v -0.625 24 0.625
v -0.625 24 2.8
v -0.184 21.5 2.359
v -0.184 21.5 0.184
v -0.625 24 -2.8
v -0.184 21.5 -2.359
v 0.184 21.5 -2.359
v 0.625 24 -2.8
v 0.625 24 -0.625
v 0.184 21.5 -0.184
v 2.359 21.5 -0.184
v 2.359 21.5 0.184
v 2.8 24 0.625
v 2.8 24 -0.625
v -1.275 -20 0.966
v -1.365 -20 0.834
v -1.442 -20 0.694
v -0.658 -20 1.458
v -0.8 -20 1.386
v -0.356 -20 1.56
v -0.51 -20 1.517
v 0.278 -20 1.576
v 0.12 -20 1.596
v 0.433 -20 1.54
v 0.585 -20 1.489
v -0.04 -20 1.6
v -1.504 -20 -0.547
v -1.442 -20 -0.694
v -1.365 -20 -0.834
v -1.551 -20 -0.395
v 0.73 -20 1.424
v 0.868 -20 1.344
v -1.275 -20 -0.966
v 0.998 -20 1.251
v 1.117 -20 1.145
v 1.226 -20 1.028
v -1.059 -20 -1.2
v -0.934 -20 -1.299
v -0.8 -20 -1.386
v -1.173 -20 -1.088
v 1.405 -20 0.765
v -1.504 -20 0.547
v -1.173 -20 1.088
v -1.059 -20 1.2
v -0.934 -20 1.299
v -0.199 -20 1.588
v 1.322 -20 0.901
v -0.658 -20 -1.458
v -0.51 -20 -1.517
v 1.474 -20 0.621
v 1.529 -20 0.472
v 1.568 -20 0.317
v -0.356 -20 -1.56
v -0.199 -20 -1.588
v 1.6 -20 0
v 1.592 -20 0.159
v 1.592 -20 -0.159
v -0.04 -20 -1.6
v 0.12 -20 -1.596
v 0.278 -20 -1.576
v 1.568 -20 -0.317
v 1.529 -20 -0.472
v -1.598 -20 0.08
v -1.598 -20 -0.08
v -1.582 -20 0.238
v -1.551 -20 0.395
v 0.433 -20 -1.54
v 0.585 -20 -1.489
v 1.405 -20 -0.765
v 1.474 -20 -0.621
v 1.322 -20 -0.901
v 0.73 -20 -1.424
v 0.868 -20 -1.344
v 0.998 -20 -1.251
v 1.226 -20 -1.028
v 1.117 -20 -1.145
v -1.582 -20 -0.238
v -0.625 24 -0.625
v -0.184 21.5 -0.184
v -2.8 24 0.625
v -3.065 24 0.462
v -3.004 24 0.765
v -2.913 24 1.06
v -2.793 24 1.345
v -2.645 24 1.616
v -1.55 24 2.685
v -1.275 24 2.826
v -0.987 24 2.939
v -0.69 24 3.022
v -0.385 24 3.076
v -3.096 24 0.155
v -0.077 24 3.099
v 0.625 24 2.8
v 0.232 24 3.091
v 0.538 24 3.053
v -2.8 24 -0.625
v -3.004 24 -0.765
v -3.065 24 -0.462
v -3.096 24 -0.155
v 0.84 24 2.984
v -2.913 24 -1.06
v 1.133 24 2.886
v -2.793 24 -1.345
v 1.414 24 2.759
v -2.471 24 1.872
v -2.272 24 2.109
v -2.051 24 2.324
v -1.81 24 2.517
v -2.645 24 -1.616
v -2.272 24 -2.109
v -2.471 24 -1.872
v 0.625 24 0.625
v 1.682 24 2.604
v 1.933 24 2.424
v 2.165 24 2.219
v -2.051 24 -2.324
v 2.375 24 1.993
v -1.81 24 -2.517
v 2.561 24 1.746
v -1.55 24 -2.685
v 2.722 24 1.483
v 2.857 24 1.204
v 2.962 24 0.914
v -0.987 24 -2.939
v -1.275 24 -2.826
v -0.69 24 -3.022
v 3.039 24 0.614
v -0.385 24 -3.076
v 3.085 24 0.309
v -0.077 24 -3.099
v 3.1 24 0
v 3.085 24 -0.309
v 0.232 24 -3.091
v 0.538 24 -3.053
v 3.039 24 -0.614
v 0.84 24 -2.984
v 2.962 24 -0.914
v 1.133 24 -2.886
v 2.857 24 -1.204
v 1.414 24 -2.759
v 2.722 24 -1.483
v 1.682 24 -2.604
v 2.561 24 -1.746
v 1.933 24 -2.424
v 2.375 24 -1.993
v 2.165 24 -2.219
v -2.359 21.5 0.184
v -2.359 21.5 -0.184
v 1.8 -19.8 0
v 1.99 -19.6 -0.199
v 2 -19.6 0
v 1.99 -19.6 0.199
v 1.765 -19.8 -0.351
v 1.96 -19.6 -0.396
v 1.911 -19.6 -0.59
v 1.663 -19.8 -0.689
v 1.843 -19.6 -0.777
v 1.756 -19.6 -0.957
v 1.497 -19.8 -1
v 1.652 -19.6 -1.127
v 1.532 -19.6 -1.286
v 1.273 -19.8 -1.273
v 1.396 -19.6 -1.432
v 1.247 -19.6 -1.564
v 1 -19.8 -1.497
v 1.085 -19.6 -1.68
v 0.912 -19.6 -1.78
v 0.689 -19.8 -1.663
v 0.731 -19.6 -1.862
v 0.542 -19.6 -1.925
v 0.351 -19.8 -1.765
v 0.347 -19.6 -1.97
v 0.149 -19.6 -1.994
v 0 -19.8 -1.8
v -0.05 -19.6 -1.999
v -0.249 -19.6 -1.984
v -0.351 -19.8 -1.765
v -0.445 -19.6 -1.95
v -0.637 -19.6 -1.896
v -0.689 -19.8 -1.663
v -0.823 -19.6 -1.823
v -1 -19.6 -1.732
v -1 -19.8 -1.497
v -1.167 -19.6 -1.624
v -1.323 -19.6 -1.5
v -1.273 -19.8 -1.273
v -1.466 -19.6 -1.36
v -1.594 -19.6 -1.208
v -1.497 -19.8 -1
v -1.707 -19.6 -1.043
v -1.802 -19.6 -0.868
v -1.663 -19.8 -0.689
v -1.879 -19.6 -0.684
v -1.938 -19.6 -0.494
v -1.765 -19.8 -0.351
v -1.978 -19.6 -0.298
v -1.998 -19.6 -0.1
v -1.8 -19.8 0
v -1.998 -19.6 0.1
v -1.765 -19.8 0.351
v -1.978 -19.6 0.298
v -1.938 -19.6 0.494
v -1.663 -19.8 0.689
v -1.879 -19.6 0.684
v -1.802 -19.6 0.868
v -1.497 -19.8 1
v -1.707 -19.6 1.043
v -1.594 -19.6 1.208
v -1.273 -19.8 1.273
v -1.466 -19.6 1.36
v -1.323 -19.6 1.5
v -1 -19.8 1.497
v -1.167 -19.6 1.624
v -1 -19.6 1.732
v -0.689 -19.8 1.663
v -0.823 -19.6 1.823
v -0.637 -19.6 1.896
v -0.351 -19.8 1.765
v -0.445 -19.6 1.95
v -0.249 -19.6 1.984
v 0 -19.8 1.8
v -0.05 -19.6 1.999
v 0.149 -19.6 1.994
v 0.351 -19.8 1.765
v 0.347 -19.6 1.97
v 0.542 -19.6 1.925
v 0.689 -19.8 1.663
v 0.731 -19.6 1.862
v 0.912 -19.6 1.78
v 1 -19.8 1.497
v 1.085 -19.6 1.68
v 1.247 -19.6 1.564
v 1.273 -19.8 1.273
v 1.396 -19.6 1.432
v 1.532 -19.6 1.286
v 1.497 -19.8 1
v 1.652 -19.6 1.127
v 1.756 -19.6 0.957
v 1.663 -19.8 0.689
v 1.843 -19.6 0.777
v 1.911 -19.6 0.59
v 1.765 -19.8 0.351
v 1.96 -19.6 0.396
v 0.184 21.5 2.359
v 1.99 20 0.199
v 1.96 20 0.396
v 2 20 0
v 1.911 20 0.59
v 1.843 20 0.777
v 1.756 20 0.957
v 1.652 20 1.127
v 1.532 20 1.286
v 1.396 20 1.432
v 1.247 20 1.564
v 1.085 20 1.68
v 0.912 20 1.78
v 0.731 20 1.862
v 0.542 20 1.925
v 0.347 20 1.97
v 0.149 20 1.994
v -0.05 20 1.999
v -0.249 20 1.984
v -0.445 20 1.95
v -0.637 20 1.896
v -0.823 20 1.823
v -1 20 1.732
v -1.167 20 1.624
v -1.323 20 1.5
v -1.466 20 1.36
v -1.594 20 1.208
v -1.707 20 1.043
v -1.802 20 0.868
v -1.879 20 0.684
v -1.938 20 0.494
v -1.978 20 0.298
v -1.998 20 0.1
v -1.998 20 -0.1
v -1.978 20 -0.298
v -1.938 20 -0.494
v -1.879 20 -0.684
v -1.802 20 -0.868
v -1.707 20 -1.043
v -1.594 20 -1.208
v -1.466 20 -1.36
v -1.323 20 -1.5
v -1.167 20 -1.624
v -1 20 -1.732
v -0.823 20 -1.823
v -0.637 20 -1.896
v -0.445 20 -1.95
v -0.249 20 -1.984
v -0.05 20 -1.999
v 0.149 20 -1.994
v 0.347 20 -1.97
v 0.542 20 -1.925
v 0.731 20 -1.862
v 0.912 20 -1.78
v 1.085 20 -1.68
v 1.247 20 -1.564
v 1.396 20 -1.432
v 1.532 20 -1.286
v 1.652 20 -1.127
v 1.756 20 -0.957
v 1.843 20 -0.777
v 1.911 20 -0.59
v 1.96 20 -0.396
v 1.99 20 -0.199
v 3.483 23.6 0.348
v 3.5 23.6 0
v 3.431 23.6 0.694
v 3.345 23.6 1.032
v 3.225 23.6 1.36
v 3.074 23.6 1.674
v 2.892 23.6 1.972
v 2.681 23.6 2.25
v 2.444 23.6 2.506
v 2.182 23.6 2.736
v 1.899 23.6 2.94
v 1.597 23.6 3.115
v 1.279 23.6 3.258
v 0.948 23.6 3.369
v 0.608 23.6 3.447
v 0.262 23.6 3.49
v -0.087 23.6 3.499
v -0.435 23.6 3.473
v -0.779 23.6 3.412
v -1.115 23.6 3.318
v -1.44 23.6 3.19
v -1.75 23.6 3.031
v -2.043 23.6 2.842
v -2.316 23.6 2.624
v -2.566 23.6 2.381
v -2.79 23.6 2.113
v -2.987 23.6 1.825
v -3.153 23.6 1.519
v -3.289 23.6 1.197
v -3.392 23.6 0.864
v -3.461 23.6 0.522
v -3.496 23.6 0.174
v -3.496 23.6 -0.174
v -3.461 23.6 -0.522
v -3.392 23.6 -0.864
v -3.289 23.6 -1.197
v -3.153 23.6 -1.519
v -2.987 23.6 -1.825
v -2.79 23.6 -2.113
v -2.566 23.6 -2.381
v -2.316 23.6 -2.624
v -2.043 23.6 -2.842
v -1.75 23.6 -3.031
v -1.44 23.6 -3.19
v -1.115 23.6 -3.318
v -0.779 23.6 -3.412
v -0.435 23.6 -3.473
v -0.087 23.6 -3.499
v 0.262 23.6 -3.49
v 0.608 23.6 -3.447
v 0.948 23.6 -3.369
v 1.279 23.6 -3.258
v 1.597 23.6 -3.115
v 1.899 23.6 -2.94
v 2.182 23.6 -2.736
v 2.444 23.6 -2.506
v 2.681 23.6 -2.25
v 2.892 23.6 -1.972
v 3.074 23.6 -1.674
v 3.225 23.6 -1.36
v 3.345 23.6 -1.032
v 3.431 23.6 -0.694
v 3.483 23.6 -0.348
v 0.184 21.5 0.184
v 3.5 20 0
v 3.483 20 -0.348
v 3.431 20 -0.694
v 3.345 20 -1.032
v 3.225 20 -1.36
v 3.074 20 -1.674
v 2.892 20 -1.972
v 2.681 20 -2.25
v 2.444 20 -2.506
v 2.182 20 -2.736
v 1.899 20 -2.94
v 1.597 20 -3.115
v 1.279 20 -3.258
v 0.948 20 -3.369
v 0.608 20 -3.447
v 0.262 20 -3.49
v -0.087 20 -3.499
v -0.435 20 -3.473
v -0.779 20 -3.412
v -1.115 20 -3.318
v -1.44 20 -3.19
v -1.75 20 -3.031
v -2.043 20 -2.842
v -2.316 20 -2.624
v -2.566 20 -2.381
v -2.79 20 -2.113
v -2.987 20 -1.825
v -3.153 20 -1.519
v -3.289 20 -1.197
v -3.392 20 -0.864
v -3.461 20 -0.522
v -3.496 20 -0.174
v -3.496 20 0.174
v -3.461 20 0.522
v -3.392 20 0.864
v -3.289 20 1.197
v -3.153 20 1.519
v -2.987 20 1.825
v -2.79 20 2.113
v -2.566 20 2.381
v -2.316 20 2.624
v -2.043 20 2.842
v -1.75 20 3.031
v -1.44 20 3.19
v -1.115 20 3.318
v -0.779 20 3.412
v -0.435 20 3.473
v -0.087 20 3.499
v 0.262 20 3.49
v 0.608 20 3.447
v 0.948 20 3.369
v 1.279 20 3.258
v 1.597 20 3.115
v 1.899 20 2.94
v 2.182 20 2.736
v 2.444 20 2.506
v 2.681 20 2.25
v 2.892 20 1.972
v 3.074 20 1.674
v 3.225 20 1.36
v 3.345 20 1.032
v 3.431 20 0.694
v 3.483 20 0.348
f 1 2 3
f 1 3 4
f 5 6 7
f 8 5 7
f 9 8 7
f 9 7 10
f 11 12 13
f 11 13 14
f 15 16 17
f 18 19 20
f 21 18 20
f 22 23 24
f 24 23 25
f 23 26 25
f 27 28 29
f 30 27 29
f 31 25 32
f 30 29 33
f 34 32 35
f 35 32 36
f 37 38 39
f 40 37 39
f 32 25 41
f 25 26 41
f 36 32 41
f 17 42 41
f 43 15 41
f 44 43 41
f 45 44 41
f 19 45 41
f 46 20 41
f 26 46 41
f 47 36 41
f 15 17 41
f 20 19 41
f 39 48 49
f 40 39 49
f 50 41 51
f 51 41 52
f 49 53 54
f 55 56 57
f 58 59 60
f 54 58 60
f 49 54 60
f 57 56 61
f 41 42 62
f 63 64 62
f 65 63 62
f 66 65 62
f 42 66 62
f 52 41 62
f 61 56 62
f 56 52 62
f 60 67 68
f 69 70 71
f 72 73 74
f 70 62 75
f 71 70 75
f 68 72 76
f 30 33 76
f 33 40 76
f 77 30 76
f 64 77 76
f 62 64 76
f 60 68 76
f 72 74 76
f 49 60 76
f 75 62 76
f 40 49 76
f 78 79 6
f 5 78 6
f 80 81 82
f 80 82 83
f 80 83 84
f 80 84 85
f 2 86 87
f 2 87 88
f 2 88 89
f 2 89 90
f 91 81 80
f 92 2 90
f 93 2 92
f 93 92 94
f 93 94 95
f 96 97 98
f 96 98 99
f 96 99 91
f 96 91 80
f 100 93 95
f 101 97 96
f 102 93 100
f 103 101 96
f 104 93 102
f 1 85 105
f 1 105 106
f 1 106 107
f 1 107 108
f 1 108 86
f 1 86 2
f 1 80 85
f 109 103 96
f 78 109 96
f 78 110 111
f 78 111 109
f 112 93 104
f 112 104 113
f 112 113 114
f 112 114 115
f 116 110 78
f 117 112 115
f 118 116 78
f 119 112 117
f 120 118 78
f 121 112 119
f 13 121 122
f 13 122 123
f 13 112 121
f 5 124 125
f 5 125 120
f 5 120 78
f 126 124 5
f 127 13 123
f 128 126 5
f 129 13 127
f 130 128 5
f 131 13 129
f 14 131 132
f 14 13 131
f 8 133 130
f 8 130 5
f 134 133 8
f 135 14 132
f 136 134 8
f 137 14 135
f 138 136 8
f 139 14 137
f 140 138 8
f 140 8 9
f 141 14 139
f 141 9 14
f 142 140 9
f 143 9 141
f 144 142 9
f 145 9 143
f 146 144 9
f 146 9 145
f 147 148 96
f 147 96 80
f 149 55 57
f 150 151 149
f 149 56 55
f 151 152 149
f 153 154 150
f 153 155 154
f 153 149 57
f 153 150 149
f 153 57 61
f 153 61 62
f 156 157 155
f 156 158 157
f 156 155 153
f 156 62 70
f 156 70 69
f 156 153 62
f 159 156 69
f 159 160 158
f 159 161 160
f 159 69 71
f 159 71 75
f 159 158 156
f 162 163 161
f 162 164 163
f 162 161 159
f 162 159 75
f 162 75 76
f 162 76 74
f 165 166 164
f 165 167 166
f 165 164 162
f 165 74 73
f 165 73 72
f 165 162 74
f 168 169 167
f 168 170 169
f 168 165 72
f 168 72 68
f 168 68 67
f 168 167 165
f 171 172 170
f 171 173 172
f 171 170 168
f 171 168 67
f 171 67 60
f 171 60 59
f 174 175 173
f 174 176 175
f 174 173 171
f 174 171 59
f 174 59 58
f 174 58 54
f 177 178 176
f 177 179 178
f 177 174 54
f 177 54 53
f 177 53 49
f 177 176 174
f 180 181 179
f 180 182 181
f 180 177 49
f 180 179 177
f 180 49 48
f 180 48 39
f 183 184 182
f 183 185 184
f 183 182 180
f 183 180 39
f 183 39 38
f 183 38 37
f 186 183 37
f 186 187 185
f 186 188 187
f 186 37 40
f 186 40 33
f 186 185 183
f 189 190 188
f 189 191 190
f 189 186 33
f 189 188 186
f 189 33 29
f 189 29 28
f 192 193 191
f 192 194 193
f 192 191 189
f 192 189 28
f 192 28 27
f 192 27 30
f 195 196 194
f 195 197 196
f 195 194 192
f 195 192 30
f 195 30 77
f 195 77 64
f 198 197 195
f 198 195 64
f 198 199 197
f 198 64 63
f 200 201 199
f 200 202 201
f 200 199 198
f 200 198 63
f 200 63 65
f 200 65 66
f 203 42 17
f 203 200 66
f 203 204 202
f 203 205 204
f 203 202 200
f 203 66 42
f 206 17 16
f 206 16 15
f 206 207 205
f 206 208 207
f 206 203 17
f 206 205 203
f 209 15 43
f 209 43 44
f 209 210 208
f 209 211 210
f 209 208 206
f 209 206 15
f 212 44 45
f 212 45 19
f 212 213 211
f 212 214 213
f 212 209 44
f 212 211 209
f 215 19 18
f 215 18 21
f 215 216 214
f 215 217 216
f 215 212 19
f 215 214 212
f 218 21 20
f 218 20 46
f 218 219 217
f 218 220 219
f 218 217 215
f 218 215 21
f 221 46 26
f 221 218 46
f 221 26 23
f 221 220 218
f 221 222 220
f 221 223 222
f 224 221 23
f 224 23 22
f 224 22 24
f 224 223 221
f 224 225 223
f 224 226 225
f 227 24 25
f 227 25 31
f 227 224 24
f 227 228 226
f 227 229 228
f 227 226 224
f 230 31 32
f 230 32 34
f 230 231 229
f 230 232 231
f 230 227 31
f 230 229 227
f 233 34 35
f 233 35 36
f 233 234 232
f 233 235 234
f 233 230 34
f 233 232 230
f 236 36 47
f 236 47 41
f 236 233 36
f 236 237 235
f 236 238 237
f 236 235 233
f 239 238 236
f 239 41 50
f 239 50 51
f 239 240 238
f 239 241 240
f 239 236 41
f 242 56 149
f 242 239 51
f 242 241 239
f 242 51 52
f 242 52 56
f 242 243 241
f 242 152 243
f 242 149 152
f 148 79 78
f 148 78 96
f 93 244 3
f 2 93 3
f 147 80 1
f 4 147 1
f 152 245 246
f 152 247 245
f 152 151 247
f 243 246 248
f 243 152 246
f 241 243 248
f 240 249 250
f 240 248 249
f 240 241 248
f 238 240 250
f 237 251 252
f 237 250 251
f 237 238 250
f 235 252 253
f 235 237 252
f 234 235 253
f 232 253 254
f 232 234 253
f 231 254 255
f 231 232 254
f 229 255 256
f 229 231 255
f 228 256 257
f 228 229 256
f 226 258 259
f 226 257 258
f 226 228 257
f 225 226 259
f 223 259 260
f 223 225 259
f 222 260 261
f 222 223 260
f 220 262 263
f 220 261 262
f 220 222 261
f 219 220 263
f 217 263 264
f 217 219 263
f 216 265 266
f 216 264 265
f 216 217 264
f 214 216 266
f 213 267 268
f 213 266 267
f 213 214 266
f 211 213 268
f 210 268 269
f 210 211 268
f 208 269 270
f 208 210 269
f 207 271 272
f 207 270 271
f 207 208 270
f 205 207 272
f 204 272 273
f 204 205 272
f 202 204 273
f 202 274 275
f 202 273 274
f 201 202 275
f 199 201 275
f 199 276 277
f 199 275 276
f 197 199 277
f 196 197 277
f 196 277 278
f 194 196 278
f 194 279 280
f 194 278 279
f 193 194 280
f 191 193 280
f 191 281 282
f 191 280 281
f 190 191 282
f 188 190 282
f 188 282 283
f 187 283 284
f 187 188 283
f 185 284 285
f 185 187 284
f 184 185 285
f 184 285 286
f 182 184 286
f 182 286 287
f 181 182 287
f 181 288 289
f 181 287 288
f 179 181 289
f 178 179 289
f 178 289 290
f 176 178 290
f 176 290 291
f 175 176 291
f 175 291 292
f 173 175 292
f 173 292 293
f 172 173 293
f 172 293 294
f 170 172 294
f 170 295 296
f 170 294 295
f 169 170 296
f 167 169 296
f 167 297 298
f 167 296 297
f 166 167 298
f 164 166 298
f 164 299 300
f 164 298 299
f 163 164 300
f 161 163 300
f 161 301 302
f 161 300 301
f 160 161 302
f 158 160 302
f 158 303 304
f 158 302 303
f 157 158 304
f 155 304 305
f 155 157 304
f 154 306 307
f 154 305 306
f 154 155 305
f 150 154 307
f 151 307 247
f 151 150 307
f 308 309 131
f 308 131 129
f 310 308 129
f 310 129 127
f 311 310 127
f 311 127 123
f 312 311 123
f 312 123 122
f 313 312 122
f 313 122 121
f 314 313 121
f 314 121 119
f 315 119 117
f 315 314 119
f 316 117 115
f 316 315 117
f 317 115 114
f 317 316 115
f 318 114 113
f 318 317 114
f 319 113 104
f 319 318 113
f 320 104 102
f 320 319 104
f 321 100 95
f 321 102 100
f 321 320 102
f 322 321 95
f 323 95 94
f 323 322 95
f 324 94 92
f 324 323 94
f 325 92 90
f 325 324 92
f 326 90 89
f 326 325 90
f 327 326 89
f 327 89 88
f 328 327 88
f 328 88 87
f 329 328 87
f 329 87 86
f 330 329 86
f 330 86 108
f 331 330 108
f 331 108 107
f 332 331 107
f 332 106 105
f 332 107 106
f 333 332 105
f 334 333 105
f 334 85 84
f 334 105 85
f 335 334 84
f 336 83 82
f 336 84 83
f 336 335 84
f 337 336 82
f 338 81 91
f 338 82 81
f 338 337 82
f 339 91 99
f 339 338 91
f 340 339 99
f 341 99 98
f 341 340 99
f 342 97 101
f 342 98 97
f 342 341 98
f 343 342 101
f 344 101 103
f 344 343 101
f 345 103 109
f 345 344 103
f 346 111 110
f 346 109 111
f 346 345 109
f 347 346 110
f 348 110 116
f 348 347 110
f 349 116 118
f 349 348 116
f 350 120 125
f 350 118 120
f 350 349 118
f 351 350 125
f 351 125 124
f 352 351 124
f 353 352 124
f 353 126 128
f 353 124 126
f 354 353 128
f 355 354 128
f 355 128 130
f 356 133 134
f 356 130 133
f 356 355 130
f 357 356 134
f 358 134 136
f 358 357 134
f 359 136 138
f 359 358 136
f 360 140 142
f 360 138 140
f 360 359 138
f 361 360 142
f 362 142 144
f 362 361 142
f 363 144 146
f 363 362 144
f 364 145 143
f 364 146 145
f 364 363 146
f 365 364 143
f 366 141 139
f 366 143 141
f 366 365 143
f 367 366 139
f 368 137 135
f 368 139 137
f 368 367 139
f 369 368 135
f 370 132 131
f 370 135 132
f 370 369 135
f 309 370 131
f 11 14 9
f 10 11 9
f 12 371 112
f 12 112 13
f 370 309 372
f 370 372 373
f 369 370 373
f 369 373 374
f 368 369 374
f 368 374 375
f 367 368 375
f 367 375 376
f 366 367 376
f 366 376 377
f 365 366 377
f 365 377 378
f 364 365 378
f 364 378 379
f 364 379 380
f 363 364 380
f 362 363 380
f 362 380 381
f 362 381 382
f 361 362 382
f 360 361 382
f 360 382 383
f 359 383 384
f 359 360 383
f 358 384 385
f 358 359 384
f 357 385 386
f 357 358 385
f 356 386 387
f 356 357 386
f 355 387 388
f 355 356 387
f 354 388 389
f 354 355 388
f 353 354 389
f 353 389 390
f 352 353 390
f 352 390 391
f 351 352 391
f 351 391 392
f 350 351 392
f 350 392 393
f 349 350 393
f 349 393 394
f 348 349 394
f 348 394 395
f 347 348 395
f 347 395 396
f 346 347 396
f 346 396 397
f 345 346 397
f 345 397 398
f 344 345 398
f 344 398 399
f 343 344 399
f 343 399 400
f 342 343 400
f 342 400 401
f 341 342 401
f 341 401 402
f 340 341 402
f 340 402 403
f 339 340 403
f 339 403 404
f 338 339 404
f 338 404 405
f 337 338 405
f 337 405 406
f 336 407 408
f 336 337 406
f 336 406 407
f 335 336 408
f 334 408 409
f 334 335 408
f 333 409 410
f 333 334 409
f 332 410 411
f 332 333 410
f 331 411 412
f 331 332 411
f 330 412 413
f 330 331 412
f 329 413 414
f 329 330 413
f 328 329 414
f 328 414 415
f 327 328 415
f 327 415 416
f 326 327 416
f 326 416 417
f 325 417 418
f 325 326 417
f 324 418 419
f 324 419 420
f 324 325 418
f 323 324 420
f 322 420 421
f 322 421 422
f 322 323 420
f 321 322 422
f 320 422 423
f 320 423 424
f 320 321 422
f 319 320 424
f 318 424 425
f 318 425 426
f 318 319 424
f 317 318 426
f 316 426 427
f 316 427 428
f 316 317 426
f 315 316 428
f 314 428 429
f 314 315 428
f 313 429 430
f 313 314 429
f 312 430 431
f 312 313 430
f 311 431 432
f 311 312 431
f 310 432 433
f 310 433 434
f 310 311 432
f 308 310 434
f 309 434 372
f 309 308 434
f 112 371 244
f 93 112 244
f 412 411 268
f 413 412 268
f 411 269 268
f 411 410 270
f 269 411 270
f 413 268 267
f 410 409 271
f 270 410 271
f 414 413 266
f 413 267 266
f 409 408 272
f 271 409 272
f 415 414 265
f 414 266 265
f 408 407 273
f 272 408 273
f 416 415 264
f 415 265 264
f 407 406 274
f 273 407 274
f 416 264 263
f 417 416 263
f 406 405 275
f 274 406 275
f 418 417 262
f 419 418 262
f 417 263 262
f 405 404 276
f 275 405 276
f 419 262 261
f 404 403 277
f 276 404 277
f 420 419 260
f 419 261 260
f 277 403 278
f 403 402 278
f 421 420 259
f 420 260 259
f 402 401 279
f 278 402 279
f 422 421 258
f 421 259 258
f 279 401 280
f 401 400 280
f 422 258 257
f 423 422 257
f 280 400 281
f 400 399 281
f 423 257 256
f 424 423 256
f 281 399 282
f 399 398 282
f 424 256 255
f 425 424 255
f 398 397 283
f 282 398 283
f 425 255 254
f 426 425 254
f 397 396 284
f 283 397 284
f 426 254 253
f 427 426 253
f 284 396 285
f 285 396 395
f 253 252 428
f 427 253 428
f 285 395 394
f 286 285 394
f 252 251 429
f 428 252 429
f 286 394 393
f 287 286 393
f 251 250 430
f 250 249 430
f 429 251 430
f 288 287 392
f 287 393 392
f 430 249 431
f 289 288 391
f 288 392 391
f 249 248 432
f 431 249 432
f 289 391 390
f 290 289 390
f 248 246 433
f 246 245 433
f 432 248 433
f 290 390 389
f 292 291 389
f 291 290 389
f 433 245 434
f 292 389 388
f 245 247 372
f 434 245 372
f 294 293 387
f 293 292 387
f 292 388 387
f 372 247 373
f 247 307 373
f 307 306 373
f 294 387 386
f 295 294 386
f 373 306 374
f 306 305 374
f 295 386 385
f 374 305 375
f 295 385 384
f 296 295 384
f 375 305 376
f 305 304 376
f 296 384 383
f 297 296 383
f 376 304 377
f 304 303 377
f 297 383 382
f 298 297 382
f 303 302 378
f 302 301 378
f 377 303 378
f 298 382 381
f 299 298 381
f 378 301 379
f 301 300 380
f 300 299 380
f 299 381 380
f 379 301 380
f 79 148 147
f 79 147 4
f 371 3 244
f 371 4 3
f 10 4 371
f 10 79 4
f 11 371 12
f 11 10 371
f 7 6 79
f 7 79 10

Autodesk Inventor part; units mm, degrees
ref_plane "YZ Plane" through (0, 0, 0) normal (1, 0, 0) x (0, 1, 0)
ref_plane "XZ Plane" through (0, 0, 0) normal (0, 1, 0) x (-1, 0, 0)
ref_plane "XY Plane" through (0, 0, 0) normal (0, 0, 1) x (1, 0, 0)
sketch "Sketch1" plane through (0, 0, 0) normal (0, 0, 1) x (1, 0, 0)
  line L0 (-2, -20) -> (-2, 20)
  line L1 (-2, 20) -> (2, 20)
  line L2 (2, 20) -> (2, -20)
  line L3 (2, -20) -> (-2, -20)
  line L4 (-2, -20) -> (2, 20) construction
  line L5 (-2, 20) -> (2, -20) construction
  line L6 (0, -20) -> (0, -19.6)
  line L7 (0, -20) -> (1.6, -20)
  line L8 (0, -20) -> (-1.6, -20)
  line L9 (-1.6, -20) -> (-2, -19.6)
  line L10 (0, 22.999163) -> (0, 17.000837)
  line L11 (0, 20) -> (0, 24)
  line L12 (0, 24) -> (3.5, 24)
  line L13 (0, 20) -> (3.5, 20)
  line L14 (3.5, 20) -> (3.5, 24)
  line L15 (0, 24) -> (-3.5, 24)
  line L16 (-3.5, 24) -> (-3.5, 20)
  line L17 (-3.5, 20) -> (0, 20)
  line L18 (0, 24) -> (3.1, 24)
  line L19 (0, 24) -> (0, 23.6)
  line L20 (3.1, 24) -> (3.5, 23.6)
  line L21 (0, 24) -> (-3.1, 24)
  line L22 (1.6, -20) -> (2, -19.6)
  line L23 (0, 20) -> (0, -20.824074)
  line L24 (0, -20) -> (0, 20)
  point P0 (0, 0)
  dimension "d0" = 40
  dimension "d1" = 4
  dimension "d2" = 0.4
  dimension "d3" = 1.6
  dimension "d4" = 1.6
  dimension "d5" = 4
  dimension "d6" = 3.5
  dimension "d7" = 3.5
  dimension "d8" = 3.1
  dimension "d9" = 0.4
  dimension "d10" = 3.1
revolve "Revolution1" add sketch "Sketch1" angle 360 about axis through (0, -20, 0) along (0, 1, 0) contours L6 L23 L10 L1 L2 L22 L3 | L10 L11 L12 L20 L14 L13 L1
sketch "Sketch2" plane through (0, 24, 0) normal (0, 1, 0) x (1, 0, 0)
  line L0 (-2.8, -0.625) -> (2.8, -0.625)
  line L1 (2.8, -0.625) -> (2.8, 0.625)
  line L2 (2.8, 0.625) -> (-2.8, 0.625)
  line L3 (-2.8, 0.625) -> (-2.8, -0.625)
  line L4 (-2.8, -0.625) -> (2.8, 0.625) construction
  line L5 (2.8, -0.625) -> (-2.8, 0.625) construction
  line L6 (-0.625, -2.8) -> (-0.625, 2.8)
  line L7 (-0.625, 2.8) -> (0.625, 2.8)
  line L8 (0.625, 2.8) -> (0.625, -2.8)
  line L9 (0.625, -2.8) -> (-0.625, -2.8)
  circle A0 centre (0, 0) radius 2 projected
  line L10 (-0.625, -2.8) -> (0.625, 2.8) construction
  line L11 (-0.625, 2.8) -> (0.625, -2.8) construction
  dimension "d12" = 5.6
  dimension "d13" = 1.25
  dimension "d14" = 5.6
  dimension "d15" = 1.25
sketch "Sketch2 outline for Extrusion1" plane through (0, 24, 0) normal (0, 1, 0) x (1, 0, 0)
  line L0 (-0.625, -2.8) -> (-0.625, -0.625)
  line L1 (0.625, -2.8) -> (-0.625, -2.8)
  line L2 (0.625, -0.625) -> (0.625, -2.8)
  line L3 (0.625, -0.625) -> (2.8, -0.625)
  line L4 (2.8, -0.625) -> (2.8, 0.625)
  line L5 (2.8, 0.625) -> (0.625, 0.625)
  line L6 (0.625, 2.8) -> (0.625, 0.625)
  line L7 (-0.625, 2.8) -> (0.625, 2.8)
  line L8 (-0.625, 0.625) -> (-0.625, 2.8)
  line L9 (-0.625, 0.625) -> (-2.8, 0.625)
  line L10 (-2.8, 0.625) -> (-2.8, -0.625)
  line L11 (-2.8, -0.625) -> (-0.625, -0.625)
extrude "Extrusion1" cut sketch "Sketch2 outline for Extrusion1" against normal blind 2.5 draft -10
properties part number "Screws" material "Steel"
